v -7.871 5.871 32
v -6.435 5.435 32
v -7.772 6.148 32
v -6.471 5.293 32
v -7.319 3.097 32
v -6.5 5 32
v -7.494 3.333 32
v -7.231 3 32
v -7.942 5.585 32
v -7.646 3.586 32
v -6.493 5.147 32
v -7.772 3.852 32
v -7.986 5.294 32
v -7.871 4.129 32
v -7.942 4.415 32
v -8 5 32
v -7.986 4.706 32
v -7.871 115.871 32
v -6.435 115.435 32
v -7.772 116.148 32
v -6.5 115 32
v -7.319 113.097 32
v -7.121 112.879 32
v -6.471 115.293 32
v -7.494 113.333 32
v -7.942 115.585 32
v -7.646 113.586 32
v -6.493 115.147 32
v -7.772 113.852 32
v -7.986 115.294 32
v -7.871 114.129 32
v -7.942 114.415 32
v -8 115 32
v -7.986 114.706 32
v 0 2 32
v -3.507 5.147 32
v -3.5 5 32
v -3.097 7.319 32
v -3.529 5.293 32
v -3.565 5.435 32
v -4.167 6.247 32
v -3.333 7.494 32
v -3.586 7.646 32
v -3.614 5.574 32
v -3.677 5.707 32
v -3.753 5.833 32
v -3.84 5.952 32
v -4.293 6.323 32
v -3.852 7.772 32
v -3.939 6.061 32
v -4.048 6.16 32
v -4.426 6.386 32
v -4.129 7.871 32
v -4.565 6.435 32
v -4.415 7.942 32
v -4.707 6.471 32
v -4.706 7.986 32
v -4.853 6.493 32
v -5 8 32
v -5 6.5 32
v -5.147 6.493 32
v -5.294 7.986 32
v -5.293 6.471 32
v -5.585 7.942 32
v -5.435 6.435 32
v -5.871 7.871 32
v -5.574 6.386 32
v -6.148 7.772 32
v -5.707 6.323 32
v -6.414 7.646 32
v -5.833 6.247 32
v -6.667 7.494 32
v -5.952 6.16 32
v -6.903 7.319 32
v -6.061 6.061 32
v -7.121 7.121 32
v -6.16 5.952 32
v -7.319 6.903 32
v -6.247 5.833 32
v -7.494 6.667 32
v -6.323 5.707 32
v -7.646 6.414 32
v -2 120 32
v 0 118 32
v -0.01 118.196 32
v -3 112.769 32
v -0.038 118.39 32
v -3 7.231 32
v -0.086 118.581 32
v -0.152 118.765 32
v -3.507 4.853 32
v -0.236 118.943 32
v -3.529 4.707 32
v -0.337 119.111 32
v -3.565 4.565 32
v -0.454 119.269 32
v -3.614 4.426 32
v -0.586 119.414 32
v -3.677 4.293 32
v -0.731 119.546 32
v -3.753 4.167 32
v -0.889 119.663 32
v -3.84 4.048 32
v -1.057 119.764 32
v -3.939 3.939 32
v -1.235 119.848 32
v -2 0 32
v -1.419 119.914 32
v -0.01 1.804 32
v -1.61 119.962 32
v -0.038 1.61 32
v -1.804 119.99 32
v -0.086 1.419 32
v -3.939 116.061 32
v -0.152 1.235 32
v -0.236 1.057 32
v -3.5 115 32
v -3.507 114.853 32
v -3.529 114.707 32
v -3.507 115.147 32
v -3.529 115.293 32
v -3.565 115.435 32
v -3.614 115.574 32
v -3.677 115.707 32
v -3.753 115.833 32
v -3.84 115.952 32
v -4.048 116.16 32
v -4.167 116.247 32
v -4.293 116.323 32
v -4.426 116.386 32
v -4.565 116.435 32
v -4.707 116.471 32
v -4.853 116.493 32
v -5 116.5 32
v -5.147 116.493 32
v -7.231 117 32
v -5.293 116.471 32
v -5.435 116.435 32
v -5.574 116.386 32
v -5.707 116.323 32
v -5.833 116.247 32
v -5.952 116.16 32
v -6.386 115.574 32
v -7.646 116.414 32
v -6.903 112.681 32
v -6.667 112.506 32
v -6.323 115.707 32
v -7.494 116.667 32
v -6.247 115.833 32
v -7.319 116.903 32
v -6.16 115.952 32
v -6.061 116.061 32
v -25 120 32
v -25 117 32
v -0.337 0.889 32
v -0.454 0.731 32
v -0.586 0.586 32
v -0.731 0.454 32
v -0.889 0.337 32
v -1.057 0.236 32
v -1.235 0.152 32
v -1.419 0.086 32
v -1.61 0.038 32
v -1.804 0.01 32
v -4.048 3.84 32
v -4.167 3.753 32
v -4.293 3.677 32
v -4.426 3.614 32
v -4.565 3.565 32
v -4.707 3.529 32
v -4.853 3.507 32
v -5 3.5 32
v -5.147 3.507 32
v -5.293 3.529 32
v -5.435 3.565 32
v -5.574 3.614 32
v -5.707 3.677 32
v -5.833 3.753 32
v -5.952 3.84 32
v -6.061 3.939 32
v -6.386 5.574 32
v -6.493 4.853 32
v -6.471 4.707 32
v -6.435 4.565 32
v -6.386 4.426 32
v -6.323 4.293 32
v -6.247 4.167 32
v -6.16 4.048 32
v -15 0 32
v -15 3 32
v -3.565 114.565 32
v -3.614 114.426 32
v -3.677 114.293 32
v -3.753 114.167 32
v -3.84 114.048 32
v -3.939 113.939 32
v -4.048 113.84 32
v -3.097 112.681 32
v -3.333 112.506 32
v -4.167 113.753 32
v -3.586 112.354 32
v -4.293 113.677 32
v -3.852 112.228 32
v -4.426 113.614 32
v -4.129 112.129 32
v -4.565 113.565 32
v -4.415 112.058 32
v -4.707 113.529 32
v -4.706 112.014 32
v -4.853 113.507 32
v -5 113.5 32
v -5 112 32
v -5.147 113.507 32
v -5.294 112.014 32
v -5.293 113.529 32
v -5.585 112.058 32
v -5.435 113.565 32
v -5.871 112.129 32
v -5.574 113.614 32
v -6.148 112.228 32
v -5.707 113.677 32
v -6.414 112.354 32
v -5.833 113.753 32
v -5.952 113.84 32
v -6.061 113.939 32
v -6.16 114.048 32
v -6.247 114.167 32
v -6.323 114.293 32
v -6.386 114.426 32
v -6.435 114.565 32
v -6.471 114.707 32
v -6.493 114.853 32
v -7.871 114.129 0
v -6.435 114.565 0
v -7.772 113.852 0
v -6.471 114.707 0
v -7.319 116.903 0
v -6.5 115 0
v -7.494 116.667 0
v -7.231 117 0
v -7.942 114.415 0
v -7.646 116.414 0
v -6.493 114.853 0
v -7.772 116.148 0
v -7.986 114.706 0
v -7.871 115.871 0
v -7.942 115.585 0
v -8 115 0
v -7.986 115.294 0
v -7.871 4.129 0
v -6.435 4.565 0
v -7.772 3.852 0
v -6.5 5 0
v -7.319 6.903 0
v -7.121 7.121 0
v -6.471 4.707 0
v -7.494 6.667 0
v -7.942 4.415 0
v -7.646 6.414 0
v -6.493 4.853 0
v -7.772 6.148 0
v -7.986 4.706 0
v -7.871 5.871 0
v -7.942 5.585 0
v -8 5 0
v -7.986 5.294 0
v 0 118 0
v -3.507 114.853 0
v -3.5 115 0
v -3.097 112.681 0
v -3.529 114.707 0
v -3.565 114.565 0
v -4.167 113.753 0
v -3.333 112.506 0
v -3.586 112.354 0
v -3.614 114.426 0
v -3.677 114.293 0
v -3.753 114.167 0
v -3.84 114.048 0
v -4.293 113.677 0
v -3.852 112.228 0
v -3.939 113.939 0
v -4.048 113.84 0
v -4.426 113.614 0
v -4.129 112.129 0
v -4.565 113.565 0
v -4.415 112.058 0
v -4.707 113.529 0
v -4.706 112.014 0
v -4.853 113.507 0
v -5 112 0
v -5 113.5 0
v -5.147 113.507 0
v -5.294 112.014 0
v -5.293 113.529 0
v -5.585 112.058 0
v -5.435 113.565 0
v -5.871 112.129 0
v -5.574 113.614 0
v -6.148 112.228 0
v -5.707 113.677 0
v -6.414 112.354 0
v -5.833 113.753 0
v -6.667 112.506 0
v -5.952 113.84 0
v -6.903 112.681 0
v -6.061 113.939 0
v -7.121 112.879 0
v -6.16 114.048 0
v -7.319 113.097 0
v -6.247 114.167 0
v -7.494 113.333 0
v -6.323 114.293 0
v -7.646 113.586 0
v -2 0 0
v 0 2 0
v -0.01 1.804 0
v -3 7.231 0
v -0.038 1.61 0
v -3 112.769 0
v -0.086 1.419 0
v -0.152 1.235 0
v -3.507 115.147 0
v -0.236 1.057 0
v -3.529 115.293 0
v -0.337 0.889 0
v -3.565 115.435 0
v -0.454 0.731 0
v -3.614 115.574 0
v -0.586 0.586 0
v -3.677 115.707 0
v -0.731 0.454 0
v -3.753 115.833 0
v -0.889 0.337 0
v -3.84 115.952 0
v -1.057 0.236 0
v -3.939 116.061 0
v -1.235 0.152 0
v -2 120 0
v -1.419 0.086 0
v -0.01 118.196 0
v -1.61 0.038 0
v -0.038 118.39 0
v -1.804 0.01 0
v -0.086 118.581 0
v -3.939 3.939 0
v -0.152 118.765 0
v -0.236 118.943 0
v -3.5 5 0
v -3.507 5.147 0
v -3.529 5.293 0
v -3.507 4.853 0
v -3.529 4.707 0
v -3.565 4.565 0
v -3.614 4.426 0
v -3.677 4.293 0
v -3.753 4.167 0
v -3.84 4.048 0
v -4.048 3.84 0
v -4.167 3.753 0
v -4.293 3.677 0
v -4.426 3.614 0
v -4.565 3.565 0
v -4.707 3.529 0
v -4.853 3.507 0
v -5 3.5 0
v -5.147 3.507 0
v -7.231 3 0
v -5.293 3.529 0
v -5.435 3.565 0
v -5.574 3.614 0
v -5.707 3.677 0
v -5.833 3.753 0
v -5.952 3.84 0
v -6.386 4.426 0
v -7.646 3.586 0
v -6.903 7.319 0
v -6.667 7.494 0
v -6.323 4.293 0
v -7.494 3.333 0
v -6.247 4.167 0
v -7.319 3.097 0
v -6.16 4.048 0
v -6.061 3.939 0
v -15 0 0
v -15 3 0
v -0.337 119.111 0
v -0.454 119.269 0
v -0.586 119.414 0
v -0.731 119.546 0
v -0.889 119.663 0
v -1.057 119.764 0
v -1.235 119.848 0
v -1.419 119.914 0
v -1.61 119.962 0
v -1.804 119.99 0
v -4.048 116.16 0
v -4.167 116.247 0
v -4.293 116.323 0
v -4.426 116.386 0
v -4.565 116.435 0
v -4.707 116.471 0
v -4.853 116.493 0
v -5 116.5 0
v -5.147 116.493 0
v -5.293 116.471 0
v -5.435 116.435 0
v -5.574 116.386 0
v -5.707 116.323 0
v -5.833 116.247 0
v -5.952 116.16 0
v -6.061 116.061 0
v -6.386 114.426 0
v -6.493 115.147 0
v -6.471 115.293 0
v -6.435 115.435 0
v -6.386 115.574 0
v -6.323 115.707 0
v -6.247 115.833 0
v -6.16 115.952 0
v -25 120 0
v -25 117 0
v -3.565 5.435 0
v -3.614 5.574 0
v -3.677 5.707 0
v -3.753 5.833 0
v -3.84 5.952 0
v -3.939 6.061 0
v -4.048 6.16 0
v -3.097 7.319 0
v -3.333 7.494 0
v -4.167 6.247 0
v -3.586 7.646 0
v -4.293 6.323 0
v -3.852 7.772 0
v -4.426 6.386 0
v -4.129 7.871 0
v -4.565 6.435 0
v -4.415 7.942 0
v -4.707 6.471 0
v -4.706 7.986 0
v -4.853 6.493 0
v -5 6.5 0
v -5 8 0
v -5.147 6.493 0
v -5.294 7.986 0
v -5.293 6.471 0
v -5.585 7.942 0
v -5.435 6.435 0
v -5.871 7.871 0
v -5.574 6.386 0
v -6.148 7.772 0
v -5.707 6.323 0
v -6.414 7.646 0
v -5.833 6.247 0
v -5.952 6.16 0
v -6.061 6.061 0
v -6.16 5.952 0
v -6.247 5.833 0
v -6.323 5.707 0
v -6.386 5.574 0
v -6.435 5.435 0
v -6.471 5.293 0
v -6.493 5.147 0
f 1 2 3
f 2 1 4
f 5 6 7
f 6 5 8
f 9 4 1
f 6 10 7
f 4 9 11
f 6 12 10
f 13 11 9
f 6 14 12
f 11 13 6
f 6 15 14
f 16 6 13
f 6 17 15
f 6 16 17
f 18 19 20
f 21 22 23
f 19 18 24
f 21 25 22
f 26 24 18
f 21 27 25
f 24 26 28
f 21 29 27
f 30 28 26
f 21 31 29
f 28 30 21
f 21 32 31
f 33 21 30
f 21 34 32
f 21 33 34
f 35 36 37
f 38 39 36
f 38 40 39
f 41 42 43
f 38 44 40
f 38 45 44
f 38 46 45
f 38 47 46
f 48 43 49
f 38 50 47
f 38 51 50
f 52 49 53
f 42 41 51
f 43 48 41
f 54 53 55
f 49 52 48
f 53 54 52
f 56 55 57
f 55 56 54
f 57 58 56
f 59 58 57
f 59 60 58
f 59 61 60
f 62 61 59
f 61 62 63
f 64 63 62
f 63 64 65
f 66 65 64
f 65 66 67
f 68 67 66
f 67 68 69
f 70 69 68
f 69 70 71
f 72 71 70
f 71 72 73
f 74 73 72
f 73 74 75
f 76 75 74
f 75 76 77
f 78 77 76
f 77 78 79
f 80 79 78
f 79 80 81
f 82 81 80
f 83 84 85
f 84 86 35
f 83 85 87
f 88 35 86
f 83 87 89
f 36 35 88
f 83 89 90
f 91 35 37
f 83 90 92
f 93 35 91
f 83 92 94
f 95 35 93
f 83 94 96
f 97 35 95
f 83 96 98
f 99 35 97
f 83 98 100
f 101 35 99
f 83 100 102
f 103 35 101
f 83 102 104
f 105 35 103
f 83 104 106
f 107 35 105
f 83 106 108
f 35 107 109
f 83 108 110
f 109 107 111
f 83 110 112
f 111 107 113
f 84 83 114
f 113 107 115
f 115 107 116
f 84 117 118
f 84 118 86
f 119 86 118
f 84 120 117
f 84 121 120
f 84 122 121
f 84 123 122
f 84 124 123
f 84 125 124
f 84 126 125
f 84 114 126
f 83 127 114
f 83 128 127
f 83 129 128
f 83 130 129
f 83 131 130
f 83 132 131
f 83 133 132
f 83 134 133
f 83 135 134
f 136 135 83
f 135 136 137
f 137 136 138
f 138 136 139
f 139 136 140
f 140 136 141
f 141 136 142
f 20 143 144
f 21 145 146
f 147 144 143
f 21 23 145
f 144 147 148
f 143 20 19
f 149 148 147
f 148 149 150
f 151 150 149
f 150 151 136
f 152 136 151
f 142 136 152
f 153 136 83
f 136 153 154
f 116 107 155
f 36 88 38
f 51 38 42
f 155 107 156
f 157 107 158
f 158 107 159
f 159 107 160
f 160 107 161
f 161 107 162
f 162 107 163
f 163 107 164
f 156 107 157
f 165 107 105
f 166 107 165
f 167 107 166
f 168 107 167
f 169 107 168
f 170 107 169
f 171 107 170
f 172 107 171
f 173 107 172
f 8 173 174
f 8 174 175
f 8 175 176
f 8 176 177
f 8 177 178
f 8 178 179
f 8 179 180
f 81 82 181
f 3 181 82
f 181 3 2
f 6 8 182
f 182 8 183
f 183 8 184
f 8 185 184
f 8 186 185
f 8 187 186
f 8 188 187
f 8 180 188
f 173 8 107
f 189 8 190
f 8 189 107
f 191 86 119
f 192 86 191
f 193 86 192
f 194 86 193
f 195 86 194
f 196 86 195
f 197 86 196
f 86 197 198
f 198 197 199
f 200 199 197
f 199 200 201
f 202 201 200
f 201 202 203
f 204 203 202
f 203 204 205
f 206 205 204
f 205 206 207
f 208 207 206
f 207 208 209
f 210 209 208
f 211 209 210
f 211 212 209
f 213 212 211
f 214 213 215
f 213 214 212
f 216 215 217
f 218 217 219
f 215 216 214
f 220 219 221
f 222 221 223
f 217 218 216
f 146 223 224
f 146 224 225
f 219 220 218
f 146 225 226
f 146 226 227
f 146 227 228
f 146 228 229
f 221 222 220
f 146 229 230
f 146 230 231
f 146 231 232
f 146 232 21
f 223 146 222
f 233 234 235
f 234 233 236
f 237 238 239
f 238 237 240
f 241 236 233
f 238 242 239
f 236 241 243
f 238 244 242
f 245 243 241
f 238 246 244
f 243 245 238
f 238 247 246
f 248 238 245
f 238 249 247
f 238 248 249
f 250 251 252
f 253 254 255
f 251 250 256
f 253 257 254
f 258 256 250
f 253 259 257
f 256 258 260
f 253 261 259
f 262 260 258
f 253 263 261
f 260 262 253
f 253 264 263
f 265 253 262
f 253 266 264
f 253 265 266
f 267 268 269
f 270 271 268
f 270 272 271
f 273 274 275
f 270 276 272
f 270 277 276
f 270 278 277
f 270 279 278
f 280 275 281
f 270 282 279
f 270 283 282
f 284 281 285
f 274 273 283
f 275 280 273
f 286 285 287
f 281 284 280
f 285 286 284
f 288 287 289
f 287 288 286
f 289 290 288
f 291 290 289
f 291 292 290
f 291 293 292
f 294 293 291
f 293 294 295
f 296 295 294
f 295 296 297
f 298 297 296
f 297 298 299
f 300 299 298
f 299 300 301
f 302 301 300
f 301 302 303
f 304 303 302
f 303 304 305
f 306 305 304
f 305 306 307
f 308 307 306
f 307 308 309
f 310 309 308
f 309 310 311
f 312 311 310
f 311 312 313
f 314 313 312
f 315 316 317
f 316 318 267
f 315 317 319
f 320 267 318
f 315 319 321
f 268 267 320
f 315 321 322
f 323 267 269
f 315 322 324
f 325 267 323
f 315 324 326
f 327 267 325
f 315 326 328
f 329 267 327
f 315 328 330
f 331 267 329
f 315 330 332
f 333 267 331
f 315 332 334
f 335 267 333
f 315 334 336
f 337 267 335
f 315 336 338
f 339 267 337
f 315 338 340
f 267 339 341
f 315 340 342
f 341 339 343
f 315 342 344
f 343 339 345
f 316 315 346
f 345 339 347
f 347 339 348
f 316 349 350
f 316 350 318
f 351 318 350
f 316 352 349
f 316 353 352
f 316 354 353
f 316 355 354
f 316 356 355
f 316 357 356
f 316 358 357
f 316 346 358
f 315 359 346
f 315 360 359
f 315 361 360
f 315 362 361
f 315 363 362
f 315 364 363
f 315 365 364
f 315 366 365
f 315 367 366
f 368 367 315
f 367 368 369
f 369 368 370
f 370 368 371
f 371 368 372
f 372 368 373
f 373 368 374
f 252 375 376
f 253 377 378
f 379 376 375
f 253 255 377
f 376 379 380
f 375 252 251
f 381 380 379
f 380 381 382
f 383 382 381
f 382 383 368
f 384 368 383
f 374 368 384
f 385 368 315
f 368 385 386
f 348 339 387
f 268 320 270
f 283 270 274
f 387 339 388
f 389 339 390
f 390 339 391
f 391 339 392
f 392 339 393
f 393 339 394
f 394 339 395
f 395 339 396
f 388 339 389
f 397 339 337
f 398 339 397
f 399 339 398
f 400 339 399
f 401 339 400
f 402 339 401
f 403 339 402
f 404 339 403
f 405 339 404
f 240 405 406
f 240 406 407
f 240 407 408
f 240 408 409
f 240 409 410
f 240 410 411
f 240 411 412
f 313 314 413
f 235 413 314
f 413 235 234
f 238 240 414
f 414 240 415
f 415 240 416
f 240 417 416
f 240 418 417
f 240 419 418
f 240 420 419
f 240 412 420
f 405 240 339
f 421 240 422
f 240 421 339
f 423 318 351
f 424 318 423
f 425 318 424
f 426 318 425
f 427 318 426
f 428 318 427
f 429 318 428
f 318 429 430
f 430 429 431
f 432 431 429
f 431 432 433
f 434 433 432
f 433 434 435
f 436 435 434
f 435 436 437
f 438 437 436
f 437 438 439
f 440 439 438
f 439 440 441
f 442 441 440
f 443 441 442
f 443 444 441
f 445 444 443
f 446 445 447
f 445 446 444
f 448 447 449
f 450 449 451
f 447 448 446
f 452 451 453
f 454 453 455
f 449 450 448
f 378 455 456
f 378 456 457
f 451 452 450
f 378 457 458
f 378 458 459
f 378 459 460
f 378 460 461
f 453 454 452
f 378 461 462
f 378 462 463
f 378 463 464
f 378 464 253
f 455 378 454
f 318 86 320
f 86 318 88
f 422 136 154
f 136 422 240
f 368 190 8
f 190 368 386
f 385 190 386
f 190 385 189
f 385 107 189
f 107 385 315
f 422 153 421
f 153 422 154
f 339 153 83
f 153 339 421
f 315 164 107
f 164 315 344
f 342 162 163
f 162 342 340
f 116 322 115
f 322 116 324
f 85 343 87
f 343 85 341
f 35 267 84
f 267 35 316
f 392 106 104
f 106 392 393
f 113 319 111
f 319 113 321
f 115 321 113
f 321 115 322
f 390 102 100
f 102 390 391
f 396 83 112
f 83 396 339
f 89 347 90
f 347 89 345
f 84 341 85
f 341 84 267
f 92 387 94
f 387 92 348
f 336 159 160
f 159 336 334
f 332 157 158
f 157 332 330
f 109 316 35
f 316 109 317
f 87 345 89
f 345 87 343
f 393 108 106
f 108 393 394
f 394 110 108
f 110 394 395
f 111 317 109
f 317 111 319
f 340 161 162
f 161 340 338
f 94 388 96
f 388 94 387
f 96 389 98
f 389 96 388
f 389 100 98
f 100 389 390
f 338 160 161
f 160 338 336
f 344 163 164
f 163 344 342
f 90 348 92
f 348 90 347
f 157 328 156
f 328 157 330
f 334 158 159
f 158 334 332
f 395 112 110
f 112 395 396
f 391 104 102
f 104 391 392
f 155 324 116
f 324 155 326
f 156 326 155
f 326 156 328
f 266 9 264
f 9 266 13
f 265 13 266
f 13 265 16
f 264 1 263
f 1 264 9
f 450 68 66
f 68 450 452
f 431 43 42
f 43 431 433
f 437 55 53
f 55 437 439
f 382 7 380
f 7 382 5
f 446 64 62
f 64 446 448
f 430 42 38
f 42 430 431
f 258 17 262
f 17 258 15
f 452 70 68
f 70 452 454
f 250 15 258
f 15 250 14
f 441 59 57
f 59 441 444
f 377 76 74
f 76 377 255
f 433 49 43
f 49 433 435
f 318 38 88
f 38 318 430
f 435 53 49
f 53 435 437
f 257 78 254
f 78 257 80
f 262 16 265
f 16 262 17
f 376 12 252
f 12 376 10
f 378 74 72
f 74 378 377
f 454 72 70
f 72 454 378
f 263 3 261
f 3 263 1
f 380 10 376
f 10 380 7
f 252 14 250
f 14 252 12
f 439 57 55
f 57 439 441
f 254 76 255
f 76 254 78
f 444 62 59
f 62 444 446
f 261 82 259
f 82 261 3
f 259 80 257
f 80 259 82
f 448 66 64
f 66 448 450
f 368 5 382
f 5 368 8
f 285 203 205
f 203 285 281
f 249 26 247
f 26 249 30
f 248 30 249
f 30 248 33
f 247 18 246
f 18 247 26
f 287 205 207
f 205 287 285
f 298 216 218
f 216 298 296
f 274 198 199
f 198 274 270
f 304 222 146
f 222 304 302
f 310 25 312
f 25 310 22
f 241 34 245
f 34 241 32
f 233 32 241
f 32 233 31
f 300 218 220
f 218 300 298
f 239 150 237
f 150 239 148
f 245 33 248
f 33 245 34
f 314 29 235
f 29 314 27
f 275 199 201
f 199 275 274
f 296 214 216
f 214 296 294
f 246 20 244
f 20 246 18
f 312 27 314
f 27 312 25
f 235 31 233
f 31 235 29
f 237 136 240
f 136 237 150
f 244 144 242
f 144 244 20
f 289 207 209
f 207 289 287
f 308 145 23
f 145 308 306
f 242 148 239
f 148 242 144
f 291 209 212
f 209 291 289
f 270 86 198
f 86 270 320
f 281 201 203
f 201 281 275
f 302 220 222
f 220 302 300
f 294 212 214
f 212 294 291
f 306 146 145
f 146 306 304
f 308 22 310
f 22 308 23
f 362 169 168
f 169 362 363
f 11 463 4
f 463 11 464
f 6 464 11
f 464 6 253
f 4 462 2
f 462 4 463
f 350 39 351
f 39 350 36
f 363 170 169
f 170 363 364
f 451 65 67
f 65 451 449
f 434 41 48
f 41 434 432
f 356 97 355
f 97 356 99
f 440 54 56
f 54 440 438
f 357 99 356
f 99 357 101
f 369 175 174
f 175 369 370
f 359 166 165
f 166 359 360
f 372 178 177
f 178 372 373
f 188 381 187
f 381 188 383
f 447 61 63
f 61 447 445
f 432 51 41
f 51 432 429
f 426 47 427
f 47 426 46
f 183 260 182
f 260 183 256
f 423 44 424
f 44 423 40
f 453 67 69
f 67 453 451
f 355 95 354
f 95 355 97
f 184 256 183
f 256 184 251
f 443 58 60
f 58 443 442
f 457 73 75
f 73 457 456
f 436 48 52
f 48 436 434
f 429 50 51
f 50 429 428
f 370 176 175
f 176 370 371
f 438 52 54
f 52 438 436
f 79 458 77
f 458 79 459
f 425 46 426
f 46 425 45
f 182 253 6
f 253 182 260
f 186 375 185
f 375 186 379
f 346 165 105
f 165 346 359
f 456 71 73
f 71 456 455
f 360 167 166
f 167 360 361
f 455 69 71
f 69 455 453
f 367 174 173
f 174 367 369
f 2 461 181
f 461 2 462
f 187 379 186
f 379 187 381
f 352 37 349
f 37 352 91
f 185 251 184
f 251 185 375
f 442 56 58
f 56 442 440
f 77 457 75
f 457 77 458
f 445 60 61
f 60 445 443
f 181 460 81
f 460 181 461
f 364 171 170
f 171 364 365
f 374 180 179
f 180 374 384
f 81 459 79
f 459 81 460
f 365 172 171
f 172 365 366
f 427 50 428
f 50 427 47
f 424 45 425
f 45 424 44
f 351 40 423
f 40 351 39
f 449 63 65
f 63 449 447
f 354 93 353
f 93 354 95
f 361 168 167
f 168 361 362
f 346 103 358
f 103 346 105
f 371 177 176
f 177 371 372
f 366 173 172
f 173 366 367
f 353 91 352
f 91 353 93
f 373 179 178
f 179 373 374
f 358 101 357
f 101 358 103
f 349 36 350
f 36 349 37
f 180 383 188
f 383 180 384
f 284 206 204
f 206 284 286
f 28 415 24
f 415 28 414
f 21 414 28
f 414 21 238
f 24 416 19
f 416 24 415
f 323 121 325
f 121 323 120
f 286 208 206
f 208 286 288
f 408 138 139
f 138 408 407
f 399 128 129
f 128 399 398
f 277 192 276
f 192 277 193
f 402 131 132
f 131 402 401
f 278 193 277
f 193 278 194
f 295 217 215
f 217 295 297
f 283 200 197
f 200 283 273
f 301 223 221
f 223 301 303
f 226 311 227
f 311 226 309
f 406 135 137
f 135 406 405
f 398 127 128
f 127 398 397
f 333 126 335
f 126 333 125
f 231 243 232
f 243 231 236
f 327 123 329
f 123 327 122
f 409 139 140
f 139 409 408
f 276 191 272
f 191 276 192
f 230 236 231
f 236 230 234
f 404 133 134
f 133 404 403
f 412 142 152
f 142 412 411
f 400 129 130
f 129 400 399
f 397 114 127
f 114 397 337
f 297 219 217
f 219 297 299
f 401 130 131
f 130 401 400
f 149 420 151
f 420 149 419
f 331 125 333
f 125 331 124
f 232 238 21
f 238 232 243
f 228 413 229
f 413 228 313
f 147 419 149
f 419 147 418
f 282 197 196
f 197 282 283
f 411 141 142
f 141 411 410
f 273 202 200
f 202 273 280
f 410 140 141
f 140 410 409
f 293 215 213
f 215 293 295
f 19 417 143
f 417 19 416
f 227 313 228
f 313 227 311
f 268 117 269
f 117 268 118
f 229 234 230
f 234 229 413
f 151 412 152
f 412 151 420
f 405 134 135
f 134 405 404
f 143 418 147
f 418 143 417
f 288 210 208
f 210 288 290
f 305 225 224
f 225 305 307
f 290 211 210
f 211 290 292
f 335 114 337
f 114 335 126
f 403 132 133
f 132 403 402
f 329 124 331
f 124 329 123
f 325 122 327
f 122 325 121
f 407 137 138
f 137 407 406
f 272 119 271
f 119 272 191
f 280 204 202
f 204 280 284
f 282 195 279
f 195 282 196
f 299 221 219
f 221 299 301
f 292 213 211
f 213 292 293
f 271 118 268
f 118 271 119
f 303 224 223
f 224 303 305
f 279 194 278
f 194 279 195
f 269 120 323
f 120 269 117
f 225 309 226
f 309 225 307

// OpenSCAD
$fn=64;

mirror([1, 0, 0])
union() {
  difference() {
    union() {
      minkowski() {
        translate([2, 2, 0]) cube([30-2*2, 120-2*2, 30]);
        cylinder(h=2, r=2);
      }
    }
    union() {
      translate([3, 3, 0]) cube([30-3, 120-3*2, 32]);
      // Front opening.
      translate([15, 0, 0]) cube([15, 3, 32]);
      // Back opening.
      translate([25, 120-3, 0]) cube([5, 3, 32]);    
    }
  }
  
  // Screw holes.
  difference() {
    union() {
      translate([5, 5, 0]) cylinder(h=32, d=6);
      translate([5, 120-5, 0]) cylinder(h=32, d=6);
    } 
    union() {
      translate([5, 5, 0]) cylinder(h=32, d=3);
      translate([5, 120-5, 0]) cylinder(h=32, d=3);
    }
  }
}
